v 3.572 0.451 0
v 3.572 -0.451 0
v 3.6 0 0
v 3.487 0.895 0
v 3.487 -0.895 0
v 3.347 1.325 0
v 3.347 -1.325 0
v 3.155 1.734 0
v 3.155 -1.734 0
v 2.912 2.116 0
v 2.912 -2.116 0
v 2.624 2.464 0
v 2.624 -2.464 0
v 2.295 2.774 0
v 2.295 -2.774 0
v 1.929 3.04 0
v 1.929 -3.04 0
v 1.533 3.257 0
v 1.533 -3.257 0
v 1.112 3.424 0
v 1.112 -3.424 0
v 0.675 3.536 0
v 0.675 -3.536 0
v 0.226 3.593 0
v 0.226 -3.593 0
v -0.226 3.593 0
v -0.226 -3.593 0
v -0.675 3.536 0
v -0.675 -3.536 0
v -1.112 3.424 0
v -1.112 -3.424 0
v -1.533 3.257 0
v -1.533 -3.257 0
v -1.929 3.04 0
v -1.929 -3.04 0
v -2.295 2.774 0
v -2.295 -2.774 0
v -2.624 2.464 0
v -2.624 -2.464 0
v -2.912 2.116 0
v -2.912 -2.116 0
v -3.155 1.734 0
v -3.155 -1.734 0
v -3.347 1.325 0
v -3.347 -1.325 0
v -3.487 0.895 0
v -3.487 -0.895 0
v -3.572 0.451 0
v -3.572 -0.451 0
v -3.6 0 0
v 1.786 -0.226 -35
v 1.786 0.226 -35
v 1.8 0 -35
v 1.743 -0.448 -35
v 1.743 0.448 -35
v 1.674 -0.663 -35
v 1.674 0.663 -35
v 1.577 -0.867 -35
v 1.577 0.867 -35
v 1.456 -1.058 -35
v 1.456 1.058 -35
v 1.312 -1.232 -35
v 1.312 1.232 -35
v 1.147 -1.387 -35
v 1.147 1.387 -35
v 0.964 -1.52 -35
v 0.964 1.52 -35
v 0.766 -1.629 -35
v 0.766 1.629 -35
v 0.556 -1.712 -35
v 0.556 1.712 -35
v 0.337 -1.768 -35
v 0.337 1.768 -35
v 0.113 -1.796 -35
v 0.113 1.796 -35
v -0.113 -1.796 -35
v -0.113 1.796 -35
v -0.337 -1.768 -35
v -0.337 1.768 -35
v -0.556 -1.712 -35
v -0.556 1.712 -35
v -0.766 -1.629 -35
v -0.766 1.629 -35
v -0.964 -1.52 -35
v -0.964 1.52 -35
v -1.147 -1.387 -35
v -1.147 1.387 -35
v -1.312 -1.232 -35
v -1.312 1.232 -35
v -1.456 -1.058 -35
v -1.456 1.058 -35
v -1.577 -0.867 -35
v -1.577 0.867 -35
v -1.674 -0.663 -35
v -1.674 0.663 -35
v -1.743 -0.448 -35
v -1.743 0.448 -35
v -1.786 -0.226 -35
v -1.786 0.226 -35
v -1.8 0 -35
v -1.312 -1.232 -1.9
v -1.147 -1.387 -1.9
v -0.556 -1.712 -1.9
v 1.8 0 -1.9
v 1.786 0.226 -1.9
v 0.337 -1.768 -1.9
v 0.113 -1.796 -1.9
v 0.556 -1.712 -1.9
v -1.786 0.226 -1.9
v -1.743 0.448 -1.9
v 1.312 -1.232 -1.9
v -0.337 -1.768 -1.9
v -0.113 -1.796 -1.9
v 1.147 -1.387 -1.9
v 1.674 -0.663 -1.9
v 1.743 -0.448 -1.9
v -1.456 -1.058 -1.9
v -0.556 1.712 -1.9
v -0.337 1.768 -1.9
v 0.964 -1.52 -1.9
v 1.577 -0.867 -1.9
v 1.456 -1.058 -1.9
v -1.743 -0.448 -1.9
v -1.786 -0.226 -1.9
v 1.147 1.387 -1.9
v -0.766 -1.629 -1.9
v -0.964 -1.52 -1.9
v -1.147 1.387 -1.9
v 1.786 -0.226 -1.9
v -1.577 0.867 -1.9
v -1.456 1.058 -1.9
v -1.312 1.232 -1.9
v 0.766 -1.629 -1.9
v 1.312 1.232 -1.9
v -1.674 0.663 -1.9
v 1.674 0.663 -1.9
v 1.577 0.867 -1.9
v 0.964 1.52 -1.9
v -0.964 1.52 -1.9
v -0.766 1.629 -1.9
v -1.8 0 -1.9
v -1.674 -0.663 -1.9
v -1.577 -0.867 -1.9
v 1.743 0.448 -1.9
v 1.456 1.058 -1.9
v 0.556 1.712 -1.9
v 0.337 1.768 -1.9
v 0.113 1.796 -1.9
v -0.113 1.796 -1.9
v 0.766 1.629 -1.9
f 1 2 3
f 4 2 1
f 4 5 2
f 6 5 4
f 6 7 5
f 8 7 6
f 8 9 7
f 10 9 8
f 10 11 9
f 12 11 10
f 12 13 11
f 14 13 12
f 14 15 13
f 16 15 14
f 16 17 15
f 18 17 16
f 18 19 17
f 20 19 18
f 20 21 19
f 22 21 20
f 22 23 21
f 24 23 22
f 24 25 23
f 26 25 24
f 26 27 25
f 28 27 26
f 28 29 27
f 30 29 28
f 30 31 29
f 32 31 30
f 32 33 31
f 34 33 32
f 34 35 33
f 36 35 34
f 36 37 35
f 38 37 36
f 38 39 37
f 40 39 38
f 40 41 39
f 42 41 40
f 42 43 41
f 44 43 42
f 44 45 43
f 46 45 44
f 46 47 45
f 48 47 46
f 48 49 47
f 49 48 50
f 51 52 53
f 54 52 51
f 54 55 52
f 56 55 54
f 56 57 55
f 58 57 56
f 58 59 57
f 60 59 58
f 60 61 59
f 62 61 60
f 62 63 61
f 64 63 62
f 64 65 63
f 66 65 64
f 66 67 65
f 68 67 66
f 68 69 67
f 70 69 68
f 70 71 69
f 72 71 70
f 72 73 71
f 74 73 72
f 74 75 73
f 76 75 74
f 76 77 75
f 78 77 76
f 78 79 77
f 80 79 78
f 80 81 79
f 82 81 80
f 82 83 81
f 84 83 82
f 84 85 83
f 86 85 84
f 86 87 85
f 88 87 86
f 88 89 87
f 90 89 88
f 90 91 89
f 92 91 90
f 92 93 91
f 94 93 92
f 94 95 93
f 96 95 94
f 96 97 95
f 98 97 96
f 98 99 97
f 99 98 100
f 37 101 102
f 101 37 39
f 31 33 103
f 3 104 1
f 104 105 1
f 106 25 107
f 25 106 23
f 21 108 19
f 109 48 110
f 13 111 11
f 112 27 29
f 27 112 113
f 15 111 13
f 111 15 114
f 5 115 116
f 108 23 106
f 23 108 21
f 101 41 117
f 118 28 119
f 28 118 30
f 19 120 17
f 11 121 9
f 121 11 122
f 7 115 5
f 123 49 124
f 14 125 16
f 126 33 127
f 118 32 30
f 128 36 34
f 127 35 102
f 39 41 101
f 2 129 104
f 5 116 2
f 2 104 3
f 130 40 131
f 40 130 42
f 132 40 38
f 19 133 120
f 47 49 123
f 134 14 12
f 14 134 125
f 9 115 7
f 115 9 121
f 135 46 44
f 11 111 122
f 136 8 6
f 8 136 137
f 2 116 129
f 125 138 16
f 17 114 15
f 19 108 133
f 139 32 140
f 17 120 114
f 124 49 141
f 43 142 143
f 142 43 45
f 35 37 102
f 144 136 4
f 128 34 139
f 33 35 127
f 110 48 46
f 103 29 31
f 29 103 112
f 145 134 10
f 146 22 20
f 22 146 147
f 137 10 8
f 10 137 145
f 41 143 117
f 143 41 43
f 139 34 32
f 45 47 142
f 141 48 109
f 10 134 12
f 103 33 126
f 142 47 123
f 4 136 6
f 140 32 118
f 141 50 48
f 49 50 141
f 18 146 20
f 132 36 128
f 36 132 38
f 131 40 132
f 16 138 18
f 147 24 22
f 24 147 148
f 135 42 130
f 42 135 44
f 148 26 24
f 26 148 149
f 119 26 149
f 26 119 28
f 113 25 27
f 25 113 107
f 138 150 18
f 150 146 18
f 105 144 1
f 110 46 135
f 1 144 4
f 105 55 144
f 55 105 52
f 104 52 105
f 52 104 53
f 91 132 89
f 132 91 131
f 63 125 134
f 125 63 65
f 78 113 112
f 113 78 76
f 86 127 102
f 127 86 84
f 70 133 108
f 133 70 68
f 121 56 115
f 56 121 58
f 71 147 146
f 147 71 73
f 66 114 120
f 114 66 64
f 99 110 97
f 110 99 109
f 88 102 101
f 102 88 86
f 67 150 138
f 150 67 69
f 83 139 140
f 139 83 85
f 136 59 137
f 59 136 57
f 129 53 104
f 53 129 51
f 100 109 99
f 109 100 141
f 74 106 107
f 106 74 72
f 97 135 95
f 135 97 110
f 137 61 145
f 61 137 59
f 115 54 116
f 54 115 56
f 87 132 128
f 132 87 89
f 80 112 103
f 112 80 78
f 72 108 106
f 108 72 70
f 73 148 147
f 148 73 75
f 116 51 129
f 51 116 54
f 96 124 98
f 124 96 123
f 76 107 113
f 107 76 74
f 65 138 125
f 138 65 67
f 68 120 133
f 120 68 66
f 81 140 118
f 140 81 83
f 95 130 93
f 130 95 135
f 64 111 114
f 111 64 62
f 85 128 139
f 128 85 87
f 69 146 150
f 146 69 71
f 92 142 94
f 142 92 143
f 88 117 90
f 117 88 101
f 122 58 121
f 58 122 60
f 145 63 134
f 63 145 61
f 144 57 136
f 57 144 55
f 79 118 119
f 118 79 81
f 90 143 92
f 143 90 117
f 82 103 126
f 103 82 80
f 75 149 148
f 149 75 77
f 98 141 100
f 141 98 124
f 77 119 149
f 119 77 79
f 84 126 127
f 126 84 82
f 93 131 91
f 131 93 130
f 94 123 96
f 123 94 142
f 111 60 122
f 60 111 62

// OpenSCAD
$fn = 50;


difference() {
	union() {
		translate(v = [0, 0, 0]) {
			rotate(a = [0, 0, 0]) {
				difference() {
					union() {
						translate(v = [0, 0, -35.0000000000]) {
							cylinder(h = 35, r = 1.5000000000);
						}
						translate(v = [0, 0, -1.9000000000]) {
							cylinder(h = 1.9000000000, r1 = 1.8000000000, r2 = 3.6000000000);
						}
						translate(v = [0, 0, -35.0000000000]) {
							cylinder(h = 35, r = 1.8000000000);
						}
						translate(v = [0, 0, -35.0000000000]) {
							cylinder(h = 35, r = 1.5000000000);
						}
					}
					union();
				}
			}
		}
	}
	union();
}
